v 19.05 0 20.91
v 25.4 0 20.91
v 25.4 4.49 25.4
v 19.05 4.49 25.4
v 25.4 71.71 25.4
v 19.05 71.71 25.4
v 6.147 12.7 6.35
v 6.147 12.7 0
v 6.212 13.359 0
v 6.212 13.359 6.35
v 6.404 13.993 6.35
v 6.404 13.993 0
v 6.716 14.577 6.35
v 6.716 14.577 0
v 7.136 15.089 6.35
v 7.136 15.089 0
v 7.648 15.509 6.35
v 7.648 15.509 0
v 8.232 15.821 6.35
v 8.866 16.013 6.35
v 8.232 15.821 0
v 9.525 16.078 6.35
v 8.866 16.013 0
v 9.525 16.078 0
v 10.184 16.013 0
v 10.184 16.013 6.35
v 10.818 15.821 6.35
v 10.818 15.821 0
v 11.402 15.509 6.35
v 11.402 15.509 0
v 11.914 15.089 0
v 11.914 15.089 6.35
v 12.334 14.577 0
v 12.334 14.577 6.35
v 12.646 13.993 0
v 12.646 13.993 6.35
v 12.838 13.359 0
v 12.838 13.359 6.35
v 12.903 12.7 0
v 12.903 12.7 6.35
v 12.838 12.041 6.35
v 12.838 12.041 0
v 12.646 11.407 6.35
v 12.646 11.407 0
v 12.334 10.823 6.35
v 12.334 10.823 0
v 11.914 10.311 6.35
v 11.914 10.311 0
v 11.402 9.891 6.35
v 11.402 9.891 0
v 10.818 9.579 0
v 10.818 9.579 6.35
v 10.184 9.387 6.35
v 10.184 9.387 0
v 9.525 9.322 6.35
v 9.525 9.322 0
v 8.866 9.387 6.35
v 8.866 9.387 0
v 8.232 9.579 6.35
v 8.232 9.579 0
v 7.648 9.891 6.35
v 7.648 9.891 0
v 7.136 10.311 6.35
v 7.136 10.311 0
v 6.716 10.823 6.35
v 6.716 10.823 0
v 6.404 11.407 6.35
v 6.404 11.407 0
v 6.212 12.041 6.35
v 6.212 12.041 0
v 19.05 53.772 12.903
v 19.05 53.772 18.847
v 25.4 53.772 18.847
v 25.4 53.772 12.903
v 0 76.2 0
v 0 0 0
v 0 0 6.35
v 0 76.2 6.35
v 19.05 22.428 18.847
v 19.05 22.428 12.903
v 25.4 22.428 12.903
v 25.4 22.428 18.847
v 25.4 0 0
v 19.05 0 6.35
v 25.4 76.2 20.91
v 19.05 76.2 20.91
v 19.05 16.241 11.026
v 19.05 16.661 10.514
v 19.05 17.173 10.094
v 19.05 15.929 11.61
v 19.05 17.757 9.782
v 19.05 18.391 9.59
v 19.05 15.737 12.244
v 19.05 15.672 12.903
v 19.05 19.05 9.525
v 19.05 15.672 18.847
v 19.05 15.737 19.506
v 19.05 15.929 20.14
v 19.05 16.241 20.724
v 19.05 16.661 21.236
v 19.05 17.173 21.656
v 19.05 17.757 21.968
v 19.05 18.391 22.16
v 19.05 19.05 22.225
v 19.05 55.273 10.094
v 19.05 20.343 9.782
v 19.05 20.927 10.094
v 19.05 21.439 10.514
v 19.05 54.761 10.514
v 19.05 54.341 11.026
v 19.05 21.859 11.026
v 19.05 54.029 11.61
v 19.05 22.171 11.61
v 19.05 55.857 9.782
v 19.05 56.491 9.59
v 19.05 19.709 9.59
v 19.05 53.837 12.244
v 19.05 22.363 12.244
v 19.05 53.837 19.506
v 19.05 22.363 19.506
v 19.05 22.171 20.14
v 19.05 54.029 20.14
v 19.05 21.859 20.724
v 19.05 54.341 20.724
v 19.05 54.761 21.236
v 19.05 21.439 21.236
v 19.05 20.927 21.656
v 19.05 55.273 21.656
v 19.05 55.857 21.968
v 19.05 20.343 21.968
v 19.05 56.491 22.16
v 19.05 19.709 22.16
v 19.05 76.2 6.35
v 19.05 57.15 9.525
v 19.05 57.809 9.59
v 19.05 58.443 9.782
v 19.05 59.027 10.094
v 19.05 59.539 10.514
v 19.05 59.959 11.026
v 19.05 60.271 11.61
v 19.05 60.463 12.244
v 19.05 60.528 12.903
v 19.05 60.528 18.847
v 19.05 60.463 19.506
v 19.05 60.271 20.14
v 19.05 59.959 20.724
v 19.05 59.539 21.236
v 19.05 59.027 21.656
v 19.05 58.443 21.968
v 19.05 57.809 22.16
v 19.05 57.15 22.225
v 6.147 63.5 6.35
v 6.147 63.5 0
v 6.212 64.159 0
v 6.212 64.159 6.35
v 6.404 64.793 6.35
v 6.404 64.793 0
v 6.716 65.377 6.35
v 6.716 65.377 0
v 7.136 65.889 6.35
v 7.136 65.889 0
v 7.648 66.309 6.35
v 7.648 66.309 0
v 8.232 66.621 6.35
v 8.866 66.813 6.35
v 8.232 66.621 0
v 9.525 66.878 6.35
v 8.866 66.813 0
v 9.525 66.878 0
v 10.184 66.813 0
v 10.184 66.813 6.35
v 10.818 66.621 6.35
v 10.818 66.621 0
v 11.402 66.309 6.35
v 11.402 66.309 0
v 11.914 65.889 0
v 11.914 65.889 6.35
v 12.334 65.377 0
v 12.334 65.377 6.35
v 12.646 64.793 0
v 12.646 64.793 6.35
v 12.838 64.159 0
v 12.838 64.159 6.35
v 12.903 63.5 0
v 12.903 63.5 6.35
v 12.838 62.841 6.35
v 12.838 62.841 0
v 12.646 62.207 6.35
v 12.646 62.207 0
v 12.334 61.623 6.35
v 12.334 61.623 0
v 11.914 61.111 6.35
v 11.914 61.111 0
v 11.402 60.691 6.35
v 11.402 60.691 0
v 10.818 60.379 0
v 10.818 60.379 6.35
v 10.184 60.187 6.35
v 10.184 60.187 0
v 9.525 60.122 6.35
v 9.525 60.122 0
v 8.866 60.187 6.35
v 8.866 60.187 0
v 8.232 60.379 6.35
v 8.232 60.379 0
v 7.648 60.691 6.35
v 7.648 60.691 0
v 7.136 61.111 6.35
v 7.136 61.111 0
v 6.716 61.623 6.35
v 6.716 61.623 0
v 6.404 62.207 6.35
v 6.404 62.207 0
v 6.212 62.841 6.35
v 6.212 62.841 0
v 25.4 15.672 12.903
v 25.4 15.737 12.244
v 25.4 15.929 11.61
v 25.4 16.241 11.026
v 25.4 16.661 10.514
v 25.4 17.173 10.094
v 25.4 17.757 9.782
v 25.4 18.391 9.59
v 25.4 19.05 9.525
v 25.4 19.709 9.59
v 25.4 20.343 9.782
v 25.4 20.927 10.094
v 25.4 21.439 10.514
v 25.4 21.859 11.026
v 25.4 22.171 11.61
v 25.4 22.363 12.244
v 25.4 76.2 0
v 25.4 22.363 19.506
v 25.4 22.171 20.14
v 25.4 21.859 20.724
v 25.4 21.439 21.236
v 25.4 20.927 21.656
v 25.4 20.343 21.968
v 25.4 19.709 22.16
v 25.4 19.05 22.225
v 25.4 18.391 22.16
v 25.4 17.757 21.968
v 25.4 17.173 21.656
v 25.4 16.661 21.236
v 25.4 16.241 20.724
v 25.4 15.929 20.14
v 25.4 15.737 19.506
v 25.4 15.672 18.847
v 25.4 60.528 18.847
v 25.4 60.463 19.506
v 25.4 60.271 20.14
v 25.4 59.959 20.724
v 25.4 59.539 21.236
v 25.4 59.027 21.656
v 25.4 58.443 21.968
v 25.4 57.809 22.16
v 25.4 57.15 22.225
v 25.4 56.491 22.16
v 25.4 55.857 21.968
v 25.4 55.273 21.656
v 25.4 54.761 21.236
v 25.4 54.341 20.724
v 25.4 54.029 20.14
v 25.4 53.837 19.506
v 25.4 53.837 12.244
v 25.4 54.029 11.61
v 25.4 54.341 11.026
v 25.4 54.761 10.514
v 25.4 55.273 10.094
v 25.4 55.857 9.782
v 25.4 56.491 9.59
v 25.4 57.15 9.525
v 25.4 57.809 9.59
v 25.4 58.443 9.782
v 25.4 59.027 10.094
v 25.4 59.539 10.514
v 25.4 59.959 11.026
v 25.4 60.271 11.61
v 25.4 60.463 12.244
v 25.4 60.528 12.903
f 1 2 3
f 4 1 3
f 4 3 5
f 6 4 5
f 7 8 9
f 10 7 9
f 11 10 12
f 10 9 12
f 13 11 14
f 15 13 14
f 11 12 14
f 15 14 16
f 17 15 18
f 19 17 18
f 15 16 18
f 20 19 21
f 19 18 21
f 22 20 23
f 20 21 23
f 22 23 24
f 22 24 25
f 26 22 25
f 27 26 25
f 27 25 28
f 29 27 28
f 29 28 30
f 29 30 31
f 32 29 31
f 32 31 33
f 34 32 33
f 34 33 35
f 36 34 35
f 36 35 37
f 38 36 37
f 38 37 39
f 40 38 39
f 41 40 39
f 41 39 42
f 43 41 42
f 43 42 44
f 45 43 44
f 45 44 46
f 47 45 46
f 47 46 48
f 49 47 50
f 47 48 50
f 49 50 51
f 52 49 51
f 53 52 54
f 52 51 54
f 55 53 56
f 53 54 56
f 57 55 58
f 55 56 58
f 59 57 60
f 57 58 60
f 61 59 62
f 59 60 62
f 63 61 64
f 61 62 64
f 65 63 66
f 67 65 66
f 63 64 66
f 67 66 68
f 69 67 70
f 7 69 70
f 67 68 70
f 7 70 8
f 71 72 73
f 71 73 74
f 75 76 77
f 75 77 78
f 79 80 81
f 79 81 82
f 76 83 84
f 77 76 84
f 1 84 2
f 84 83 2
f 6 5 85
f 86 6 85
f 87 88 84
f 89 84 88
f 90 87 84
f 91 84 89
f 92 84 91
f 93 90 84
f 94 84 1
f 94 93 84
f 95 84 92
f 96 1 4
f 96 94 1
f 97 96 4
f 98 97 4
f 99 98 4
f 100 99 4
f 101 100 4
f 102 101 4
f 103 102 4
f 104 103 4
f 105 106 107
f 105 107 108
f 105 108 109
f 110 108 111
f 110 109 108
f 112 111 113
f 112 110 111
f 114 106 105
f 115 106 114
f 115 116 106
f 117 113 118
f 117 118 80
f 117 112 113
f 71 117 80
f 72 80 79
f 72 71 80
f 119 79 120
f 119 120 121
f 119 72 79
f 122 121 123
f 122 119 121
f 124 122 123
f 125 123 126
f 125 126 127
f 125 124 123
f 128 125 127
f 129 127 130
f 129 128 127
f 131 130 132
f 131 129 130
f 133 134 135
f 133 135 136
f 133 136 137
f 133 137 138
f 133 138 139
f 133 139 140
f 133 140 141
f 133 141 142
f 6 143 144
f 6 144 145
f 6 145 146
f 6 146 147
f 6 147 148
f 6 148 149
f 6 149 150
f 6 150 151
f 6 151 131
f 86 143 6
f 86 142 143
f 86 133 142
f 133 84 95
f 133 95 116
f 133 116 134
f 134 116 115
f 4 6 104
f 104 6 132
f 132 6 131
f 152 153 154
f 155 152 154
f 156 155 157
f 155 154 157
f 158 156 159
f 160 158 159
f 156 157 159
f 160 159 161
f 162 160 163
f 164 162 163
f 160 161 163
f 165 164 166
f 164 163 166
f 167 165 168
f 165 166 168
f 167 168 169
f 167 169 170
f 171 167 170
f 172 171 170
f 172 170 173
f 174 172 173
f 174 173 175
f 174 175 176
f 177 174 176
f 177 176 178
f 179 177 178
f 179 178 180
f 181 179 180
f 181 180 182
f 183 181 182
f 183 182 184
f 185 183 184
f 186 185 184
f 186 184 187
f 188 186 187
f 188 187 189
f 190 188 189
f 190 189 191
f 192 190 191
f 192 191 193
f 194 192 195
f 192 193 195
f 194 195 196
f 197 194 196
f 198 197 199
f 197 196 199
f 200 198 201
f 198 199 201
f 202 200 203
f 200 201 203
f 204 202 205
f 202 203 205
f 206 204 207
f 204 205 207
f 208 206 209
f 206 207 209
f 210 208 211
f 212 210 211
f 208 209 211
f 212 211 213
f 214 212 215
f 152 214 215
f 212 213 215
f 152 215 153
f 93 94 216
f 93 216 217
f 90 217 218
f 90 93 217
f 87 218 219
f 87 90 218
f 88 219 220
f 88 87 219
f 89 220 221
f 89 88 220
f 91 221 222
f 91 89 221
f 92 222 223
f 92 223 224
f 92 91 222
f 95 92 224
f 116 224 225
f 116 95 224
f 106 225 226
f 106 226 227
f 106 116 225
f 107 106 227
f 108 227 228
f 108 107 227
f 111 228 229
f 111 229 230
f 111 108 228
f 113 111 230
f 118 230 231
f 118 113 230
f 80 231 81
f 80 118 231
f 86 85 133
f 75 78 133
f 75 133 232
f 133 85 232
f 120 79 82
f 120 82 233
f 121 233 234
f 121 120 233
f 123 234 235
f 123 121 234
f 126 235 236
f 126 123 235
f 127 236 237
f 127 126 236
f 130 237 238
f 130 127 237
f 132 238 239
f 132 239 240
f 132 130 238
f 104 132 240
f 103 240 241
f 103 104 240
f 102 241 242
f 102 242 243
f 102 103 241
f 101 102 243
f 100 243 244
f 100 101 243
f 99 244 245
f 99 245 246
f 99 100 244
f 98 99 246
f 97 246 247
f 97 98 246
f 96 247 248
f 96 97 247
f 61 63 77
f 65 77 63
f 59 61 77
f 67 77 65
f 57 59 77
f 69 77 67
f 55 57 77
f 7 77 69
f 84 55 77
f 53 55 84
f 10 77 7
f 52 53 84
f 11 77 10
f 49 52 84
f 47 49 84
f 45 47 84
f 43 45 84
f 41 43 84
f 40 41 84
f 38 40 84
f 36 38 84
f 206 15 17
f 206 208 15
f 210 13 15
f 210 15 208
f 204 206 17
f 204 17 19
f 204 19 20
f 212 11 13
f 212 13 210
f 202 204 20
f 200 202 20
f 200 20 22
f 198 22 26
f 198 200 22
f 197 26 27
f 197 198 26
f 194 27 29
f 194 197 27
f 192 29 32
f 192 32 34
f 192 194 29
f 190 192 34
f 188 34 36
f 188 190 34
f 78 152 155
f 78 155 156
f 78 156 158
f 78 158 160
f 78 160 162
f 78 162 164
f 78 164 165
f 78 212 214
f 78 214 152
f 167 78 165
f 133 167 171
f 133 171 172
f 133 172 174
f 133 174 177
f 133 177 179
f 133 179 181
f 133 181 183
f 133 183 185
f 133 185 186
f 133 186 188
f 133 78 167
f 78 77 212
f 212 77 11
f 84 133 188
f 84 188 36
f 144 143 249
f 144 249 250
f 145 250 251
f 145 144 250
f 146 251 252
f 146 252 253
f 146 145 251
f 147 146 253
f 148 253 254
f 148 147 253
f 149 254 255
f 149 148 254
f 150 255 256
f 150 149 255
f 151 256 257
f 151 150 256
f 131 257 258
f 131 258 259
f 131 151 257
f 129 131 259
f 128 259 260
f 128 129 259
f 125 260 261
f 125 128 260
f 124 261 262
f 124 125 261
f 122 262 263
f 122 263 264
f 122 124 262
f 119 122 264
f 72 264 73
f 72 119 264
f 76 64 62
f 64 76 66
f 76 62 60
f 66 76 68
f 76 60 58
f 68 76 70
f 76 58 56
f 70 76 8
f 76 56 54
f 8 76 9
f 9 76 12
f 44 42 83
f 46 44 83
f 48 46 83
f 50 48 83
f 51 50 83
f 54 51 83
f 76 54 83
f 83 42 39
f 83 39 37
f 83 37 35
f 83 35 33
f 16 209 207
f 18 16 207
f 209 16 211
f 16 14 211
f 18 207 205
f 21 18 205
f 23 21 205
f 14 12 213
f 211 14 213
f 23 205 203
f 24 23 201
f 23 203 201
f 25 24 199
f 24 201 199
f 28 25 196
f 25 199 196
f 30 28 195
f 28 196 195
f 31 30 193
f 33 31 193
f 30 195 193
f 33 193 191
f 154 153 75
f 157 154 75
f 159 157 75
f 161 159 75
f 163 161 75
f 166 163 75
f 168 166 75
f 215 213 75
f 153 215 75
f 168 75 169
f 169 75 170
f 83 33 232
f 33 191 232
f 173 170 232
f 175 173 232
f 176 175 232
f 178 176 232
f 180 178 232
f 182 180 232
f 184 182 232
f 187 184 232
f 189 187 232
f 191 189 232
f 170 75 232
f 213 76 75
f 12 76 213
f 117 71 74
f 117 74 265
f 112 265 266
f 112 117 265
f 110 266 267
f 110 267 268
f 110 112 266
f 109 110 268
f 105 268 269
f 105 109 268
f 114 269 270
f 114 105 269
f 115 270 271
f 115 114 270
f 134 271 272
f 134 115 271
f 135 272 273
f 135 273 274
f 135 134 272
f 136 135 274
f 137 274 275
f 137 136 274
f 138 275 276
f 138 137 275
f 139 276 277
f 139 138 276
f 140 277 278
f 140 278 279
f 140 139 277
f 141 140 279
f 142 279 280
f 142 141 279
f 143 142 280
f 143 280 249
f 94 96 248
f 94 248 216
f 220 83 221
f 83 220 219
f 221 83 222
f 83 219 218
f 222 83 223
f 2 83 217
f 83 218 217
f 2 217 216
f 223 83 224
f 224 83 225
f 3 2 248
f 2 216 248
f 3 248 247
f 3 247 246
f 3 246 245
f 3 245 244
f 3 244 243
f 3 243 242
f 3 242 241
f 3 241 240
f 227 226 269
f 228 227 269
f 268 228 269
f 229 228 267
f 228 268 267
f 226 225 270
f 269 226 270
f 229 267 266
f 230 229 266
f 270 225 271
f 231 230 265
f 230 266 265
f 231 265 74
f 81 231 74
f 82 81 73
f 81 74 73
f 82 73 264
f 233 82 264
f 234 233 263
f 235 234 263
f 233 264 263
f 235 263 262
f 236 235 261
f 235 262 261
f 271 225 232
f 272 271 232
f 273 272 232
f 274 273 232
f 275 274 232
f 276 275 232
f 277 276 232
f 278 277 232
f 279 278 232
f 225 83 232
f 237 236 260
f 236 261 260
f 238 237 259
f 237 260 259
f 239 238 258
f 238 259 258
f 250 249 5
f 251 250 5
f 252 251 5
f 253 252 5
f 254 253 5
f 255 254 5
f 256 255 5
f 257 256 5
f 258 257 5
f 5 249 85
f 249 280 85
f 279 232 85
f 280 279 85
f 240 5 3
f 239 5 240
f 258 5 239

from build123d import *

# Parameters (mm, degrees)
SKETCH1_W                   = 25.4
SKETCH1_H                   = 76.2
BOSS_EXTRUDE1_DEPTH         = 6.35
BOSS_EXTRUDE2_DEPTH         = 6.35
F_1_4_START                 = 19.05
F_1_4_CLEARANCE_SLOT1_DEPTH = 6.35
F_1_4_CLEARANCE_HOLE1_D     = 6.7564


# Read off the part's stored shape, not the designer's step: 1/4 Clearance Slot1
with BuildPart() as part:
    # Sketch1 → Boss-Extrude1 (new body)
    with BuildSketch(Plane.XY):
        with Locations((12.7, 38.1)):
            Rectangle(SKETCH1_W, SKETCH1_H)
    extrude(amount=BOSS_EXTRUDE1_DEPTH)

    # Sketch2 → Boss-Extrude2 (add)
    with BuildSketch(Plane(origin=(25.4, 0, 0), x_dir=(0, 0, -1), z_dir=(1, 0, 0))):
        Polygon((-6.35, 76.2), (-6.35, 0), (-20.909871939, 0), (-25.4, 4.490128061), (-25.4, 71.709871939), (-20.909871939, 76.2), align=None)
    extrude(amount=-BOSS_EXTRUDE2_DEPTH)

    # 1/4 Clearance Slot1 outline → 1/4 Clearance Slot1 (cut)
    with BuildSketch(Plane.YZ.offset(F_1_4_START)):
        with BuildLine():
            ThreePointArc((22.4282, 18.8468), (19.05, 22.225), (15.6718, 18.8468))
            Line((15.6718, 18.8468), (15.6718, 12.9032))
            ThreePointArc((15.6718, 12.9032), (19.05, 9.525), (22.4282, 12.9032))
            Line((22.4282, 12.9032), (22.4282, 18.8468))
        make_face()
        with BuildLine():
            ThreePointArc((60.5282, 18.8468), (57.15, 22.225), (53.7718, 18.8468))
            Line((53.7718, 18.8468), (53.7718, 12.9032))
            ThreePointArc((53.7718, 12.9032), (57.15, 9.525), (60.5282, 12.9032))
            Line((60.5282, 12.9032), (60.5282, 18.8468))
        make_face()
    extrude(amount=F_1_4_CLEARANCE_SLOT1_DEPTH, mode=Mode.SUBTRACT)

    # 1/4 Clearance Hole1 (through all)
    with Locations(Plane.XY.offset(6.35)):
        with Locations((9.525, 63.5), (9.525, 12.7)):
            Hole(F_1_4_CLEARANCE_HOLE1_D / 2)


solid = part.part
